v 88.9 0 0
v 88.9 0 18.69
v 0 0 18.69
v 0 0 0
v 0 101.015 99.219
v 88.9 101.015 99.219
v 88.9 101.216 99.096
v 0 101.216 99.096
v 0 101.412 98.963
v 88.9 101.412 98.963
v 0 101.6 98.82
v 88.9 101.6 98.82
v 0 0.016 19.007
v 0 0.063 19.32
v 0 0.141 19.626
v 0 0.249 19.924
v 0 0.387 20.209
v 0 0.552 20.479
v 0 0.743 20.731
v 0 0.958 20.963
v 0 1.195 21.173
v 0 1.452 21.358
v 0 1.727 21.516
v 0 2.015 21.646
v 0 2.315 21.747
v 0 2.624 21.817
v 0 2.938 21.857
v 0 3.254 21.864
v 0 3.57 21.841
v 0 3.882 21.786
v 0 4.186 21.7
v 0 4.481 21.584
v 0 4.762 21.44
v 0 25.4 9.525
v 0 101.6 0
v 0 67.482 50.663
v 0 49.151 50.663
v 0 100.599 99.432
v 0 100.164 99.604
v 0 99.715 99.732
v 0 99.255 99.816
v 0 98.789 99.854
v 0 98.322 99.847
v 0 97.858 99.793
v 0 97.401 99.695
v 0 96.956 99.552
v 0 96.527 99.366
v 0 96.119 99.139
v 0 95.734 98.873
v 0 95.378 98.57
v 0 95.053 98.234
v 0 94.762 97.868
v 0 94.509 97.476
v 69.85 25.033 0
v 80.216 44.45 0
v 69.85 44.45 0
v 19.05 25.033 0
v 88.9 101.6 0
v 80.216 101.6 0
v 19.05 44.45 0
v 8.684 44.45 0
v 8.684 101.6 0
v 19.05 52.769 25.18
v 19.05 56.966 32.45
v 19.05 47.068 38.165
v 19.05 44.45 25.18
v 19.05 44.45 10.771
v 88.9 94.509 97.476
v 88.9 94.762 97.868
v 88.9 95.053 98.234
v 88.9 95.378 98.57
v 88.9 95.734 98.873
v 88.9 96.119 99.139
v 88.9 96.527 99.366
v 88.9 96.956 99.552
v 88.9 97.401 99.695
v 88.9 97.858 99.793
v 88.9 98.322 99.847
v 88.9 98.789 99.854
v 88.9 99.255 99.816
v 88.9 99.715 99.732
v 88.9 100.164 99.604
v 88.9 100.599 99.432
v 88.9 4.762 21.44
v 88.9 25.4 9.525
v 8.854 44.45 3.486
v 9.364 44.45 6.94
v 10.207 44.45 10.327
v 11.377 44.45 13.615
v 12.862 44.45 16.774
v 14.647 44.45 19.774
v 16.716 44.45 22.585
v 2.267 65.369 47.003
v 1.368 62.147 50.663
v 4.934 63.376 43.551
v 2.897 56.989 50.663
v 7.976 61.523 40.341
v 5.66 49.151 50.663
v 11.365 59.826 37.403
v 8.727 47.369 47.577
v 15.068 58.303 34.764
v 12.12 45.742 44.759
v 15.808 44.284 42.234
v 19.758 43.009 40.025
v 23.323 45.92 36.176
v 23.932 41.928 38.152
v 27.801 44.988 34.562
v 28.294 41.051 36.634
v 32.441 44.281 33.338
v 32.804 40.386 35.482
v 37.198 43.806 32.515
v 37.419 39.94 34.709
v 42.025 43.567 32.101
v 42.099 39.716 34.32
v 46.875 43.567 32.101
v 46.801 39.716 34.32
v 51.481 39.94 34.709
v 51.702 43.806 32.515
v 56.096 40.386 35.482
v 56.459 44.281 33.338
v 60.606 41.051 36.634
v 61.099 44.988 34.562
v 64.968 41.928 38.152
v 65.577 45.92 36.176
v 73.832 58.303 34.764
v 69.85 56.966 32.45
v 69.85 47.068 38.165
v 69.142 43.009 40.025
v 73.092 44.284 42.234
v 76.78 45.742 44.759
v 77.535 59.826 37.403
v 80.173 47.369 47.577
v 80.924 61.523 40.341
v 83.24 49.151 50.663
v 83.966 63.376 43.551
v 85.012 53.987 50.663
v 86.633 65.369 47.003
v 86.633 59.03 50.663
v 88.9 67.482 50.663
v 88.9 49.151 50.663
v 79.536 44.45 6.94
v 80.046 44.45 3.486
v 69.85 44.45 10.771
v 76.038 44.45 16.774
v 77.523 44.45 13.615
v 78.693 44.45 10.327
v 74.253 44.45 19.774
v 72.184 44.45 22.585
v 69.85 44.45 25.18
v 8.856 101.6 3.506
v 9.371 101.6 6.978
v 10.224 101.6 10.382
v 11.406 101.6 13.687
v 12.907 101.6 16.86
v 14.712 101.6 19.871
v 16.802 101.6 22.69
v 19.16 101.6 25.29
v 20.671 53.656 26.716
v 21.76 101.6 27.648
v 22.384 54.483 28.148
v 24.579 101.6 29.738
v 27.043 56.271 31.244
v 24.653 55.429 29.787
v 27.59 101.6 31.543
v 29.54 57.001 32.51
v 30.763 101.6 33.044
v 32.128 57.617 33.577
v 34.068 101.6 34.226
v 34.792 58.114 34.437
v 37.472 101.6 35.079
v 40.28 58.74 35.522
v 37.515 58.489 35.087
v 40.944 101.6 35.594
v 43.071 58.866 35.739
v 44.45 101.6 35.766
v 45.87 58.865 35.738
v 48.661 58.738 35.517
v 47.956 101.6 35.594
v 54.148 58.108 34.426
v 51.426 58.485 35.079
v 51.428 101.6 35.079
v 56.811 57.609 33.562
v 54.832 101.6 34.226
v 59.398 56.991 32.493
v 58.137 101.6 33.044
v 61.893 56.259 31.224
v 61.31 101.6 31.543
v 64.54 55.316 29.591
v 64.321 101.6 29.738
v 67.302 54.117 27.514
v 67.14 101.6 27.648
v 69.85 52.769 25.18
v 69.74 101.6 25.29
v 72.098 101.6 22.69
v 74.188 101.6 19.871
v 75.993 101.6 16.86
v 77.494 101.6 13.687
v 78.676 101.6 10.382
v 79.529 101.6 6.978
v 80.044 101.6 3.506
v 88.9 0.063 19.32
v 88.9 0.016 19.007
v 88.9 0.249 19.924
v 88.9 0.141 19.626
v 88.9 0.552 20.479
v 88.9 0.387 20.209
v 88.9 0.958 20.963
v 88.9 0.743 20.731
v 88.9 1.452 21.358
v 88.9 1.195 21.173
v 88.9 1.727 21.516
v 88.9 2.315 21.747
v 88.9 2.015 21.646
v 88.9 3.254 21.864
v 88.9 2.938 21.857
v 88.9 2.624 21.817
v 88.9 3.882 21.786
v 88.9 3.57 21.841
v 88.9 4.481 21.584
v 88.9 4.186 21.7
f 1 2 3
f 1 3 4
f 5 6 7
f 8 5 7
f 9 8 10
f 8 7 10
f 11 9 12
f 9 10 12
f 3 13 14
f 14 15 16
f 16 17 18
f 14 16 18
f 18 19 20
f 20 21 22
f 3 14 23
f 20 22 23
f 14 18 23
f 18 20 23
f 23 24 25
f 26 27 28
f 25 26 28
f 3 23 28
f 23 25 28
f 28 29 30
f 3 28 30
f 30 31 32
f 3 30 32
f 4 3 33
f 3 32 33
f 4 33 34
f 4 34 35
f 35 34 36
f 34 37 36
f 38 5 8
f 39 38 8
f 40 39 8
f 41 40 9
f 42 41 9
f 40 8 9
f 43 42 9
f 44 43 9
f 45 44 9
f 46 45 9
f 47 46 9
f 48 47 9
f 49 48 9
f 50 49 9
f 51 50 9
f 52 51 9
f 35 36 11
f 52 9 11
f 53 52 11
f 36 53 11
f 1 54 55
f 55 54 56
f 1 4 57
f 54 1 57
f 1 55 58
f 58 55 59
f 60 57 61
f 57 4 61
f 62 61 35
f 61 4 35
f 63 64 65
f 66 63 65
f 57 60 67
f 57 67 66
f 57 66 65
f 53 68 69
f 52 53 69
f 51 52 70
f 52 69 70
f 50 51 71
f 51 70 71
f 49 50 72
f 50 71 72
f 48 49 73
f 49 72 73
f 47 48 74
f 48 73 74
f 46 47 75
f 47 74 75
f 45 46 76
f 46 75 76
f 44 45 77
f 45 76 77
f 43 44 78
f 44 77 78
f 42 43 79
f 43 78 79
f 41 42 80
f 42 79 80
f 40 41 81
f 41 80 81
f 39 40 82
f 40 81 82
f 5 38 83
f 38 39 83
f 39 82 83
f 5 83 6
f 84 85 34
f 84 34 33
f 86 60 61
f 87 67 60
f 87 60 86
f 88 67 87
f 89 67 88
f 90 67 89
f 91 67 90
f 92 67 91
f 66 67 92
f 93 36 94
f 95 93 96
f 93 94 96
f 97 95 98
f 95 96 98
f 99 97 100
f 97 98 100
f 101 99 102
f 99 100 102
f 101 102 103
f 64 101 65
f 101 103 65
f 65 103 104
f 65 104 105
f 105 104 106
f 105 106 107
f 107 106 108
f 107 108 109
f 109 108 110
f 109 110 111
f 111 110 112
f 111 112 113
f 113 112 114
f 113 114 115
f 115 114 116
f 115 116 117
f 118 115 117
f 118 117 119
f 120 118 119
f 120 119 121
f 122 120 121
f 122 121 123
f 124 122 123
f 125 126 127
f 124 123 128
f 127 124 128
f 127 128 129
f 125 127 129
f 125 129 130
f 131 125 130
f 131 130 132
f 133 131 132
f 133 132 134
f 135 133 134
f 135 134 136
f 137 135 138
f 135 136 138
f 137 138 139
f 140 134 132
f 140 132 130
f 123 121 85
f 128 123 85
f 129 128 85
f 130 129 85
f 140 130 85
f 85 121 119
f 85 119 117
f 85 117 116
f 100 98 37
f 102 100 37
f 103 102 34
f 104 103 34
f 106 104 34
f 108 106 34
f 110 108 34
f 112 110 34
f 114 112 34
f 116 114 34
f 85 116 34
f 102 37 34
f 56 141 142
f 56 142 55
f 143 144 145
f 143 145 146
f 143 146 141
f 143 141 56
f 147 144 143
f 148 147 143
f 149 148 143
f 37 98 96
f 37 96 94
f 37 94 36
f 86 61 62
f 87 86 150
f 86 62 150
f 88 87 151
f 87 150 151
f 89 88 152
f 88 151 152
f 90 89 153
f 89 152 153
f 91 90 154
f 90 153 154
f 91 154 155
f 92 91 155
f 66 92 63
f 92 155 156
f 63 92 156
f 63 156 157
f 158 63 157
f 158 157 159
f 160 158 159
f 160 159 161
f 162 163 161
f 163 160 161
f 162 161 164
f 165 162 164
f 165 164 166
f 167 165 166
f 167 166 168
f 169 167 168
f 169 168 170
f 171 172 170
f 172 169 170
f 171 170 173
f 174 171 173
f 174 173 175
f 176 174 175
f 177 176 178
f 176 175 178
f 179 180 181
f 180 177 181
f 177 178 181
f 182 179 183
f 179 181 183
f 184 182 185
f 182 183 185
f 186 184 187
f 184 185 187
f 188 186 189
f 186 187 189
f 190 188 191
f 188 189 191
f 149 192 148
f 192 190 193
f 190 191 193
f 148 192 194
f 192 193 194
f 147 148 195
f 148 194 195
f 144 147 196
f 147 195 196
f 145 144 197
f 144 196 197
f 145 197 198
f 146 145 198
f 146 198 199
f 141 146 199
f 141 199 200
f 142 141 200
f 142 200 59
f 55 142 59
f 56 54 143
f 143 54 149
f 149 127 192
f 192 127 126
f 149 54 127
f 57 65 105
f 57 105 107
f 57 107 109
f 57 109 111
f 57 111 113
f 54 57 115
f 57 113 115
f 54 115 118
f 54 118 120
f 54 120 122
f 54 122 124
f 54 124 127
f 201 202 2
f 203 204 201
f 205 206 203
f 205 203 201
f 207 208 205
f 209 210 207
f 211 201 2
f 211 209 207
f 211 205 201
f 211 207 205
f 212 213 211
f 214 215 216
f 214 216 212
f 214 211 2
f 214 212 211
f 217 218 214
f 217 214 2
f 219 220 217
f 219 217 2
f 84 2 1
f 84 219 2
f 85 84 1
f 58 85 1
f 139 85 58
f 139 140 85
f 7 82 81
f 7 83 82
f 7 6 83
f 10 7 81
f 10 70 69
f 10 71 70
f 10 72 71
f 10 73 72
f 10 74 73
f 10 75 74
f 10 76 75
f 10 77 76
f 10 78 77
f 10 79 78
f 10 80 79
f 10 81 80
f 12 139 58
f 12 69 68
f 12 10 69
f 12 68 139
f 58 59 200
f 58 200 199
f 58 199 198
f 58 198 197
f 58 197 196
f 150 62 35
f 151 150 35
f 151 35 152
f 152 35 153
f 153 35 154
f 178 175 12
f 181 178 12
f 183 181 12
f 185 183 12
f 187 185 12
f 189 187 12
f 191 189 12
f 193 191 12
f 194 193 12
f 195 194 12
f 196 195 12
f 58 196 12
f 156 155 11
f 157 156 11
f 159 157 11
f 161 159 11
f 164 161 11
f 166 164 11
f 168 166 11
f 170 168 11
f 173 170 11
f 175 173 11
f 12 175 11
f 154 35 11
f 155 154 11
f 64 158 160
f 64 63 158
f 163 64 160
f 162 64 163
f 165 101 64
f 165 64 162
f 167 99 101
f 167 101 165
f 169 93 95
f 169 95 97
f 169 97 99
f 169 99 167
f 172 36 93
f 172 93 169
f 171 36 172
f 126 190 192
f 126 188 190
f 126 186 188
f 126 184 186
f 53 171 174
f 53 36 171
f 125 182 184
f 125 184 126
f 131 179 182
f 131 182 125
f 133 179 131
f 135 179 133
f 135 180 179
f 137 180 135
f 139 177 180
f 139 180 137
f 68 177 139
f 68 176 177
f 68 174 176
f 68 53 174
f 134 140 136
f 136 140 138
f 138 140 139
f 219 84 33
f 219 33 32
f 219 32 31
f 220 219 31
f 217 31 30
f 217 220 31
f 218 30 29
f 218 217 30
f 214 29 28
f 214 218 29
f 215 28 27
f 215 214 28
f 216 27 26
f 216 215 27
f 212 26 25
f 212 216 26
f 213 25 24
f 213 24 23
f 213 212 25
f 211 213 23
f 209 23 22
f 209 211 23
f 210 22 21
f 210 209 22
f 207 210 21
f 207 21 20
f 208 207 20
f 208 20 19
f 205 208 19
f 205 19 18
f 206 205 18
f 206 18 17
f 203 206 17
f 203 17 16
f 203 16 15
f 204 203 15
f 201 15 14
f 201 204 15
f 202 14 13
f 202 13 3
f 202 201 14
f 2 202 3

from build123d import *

# Parameters (mm, degrees)
F1_DEPTH  = 88.9
F3_DEPTH  = 15.875
F5_DEPTH  = 88.901
F6_W      = 50.8
F6_H      = 11.43
F7_DEPTH  = 136.4343795657
F8_R      = 35.7660342863
F9_DEPTH  = 57.15
F10_W     = 50.8
F10_H     = 6.2183902673
F11_DEPTH = 10.7715678842
F13_DEPTH = 88.9
F15_DEPTH = 88.901
F17_DEPTH = 88.901


with BuildPart() as f1:
    # F0 (on Right) → F1 (new body)
    with BuildSketch(Plane.YZ):
        Polygon((0, 9.525), (0, 0), (101.6, 0), (101.6, 101.6), (78.5595260356, 101.6), (25.4, 9.525), align=None)
    extrude(amount=F1_DEPTH)

    # F2 (on face) → F3 (cut)
    with BuildSketch(Plane(origin=(0, 14.9255540145, -8.6172726281), x_dir=(1, 0, 0), z_dir=(0, -0.8660254038, 0.5))):
        with BuildLine():
            Line((0, 127.2679440423), (-3.7916075595, 108.4635424443))
            ThreePointArc((-3.7916075595, 108.4635424443), (44.45, 49.523891971), (92.6916075595, 108.4635424443))
            Line((92.6916075595, 108.4635424443), (88.9, 127.2679440423))
            Line((88.9, 127.2679440423), (88.9, 140.5219882727))
            Line((88.9, 140.5219882727), (0, 140.5219882727))
            Line((0, 140.5219882727), (0, 127.2679440423))
        make_face()
    extrude(amount=-F3_DEPTH, mode=Mode.SUBTRACT)

    # F4 (on face) → F5 (cut, through all)
    with BuildSketch(Plane.YZ.offset(88.9)):
        Polygon((103.9759144766, 114.3859309679), (96.8903970824, 101.6), (110.1333461889, 93.9541797685), (117.4411960521, 106.6117470256), align=None)
    extrude(amount=-F5_DEPTH, mode=Mode.SUBTRACT)

    # F6 (on face) → F7 (cut, through all)
    with BuildSketch(Plane(origin=(0, 68.2166897829, 118.1547726281), x_dir=(1, 0, 0), z_dir=(0, 0.5, 0.8660254038))):
        with Locations((44.45, 27.3945452561)):
            Rectangle(F6_W, F6_H)
    extrude(amount=-F7_DEPTH, mode=Mode.SUBTRACT)

    # F8 (on face) → F9 (cut)
    with BuildSketch(Plane(origin=(0, 101.6, 0), x_dir=(-1, 0, 0), z_dir=(0, 1, 0))):
        with Locations((-44.45, 0)):
            Circle(F8_R)
    extrude(amount=-F9_DEPTH, mode=Mode.SUBTRACT)

    # F10 (on face) → F11 (cut, through all)
    with BuildSketch(Plane(origin=(0, 0, 0), x_dir=(1, 0, 0), z_dir=(0, 0, -1))):
        with Locations((44.45, -41.3408048664)):
            Rectangle(F10_W, F10_H)
    extrude(amount=-F11_DEPTH, mode=Mode.SUBTRACT)

    # F12 (on face) → F13 (join)
    with BuildSketch(Plane.YZ.offset(88.9)):
        with BuildLine():
            Line((0, 9.525), (25.4, 9.525))
            Line((25.4, 9.525), (4.7625, 21.4400661804))
            ThreePointArc((4.7625, 21.4400661804), (1.5875, 21.4400661804), (0, 18.6904355234))
            Line((0, 18.6904355234), (0, 9.525))
        make_face()
    extrude(amount=-F13_DEPTH)

    # F14 (on face) → F15 (cut, through all)
    with BuildSketch(Plane.YZ.offset(88.9)):
        Polygon((49.1508753236, 50.6627227848), (67.4817463704, 50.6627227848), (53.7335930853, 58.6002227848), align=None)
    extrude(amount=-F15_DEPTH, mode=Mode.SUBTRACT)

    # F16 (on face) → F17 (cut, through all)
    with BuildSketch(Plane.YZ.offset(88.9)):
        with BuildLine():
            ThreePointArc((94.5091470824, 97.4755540145), (97.4009673604, 99.6945257608), (101.0148430585, 99.2187500055))
            Line((101.0148430585, 99.2187500055), (96.8903970824, 101.6))
            Line((96.8903970824, 101.6), (94.5091470824, 97.4755540145))
        make_face()
        with BuildLine():
            ThreePointArc((101.0148430585, 99.2187500055), (101.3148393446, 99.0303330608), (101.6, 98.8201376344))
            Line((101.6, 98.8201376344), (101.6, 98.8809094878))
            Line((101.6, 98.8809094878), (101.0148430585, 99.2187500055))
        make_face()
    extrude(amount=-F17_DEPTH, mode=Mode.SUBTRACT)


solid = f1.part
